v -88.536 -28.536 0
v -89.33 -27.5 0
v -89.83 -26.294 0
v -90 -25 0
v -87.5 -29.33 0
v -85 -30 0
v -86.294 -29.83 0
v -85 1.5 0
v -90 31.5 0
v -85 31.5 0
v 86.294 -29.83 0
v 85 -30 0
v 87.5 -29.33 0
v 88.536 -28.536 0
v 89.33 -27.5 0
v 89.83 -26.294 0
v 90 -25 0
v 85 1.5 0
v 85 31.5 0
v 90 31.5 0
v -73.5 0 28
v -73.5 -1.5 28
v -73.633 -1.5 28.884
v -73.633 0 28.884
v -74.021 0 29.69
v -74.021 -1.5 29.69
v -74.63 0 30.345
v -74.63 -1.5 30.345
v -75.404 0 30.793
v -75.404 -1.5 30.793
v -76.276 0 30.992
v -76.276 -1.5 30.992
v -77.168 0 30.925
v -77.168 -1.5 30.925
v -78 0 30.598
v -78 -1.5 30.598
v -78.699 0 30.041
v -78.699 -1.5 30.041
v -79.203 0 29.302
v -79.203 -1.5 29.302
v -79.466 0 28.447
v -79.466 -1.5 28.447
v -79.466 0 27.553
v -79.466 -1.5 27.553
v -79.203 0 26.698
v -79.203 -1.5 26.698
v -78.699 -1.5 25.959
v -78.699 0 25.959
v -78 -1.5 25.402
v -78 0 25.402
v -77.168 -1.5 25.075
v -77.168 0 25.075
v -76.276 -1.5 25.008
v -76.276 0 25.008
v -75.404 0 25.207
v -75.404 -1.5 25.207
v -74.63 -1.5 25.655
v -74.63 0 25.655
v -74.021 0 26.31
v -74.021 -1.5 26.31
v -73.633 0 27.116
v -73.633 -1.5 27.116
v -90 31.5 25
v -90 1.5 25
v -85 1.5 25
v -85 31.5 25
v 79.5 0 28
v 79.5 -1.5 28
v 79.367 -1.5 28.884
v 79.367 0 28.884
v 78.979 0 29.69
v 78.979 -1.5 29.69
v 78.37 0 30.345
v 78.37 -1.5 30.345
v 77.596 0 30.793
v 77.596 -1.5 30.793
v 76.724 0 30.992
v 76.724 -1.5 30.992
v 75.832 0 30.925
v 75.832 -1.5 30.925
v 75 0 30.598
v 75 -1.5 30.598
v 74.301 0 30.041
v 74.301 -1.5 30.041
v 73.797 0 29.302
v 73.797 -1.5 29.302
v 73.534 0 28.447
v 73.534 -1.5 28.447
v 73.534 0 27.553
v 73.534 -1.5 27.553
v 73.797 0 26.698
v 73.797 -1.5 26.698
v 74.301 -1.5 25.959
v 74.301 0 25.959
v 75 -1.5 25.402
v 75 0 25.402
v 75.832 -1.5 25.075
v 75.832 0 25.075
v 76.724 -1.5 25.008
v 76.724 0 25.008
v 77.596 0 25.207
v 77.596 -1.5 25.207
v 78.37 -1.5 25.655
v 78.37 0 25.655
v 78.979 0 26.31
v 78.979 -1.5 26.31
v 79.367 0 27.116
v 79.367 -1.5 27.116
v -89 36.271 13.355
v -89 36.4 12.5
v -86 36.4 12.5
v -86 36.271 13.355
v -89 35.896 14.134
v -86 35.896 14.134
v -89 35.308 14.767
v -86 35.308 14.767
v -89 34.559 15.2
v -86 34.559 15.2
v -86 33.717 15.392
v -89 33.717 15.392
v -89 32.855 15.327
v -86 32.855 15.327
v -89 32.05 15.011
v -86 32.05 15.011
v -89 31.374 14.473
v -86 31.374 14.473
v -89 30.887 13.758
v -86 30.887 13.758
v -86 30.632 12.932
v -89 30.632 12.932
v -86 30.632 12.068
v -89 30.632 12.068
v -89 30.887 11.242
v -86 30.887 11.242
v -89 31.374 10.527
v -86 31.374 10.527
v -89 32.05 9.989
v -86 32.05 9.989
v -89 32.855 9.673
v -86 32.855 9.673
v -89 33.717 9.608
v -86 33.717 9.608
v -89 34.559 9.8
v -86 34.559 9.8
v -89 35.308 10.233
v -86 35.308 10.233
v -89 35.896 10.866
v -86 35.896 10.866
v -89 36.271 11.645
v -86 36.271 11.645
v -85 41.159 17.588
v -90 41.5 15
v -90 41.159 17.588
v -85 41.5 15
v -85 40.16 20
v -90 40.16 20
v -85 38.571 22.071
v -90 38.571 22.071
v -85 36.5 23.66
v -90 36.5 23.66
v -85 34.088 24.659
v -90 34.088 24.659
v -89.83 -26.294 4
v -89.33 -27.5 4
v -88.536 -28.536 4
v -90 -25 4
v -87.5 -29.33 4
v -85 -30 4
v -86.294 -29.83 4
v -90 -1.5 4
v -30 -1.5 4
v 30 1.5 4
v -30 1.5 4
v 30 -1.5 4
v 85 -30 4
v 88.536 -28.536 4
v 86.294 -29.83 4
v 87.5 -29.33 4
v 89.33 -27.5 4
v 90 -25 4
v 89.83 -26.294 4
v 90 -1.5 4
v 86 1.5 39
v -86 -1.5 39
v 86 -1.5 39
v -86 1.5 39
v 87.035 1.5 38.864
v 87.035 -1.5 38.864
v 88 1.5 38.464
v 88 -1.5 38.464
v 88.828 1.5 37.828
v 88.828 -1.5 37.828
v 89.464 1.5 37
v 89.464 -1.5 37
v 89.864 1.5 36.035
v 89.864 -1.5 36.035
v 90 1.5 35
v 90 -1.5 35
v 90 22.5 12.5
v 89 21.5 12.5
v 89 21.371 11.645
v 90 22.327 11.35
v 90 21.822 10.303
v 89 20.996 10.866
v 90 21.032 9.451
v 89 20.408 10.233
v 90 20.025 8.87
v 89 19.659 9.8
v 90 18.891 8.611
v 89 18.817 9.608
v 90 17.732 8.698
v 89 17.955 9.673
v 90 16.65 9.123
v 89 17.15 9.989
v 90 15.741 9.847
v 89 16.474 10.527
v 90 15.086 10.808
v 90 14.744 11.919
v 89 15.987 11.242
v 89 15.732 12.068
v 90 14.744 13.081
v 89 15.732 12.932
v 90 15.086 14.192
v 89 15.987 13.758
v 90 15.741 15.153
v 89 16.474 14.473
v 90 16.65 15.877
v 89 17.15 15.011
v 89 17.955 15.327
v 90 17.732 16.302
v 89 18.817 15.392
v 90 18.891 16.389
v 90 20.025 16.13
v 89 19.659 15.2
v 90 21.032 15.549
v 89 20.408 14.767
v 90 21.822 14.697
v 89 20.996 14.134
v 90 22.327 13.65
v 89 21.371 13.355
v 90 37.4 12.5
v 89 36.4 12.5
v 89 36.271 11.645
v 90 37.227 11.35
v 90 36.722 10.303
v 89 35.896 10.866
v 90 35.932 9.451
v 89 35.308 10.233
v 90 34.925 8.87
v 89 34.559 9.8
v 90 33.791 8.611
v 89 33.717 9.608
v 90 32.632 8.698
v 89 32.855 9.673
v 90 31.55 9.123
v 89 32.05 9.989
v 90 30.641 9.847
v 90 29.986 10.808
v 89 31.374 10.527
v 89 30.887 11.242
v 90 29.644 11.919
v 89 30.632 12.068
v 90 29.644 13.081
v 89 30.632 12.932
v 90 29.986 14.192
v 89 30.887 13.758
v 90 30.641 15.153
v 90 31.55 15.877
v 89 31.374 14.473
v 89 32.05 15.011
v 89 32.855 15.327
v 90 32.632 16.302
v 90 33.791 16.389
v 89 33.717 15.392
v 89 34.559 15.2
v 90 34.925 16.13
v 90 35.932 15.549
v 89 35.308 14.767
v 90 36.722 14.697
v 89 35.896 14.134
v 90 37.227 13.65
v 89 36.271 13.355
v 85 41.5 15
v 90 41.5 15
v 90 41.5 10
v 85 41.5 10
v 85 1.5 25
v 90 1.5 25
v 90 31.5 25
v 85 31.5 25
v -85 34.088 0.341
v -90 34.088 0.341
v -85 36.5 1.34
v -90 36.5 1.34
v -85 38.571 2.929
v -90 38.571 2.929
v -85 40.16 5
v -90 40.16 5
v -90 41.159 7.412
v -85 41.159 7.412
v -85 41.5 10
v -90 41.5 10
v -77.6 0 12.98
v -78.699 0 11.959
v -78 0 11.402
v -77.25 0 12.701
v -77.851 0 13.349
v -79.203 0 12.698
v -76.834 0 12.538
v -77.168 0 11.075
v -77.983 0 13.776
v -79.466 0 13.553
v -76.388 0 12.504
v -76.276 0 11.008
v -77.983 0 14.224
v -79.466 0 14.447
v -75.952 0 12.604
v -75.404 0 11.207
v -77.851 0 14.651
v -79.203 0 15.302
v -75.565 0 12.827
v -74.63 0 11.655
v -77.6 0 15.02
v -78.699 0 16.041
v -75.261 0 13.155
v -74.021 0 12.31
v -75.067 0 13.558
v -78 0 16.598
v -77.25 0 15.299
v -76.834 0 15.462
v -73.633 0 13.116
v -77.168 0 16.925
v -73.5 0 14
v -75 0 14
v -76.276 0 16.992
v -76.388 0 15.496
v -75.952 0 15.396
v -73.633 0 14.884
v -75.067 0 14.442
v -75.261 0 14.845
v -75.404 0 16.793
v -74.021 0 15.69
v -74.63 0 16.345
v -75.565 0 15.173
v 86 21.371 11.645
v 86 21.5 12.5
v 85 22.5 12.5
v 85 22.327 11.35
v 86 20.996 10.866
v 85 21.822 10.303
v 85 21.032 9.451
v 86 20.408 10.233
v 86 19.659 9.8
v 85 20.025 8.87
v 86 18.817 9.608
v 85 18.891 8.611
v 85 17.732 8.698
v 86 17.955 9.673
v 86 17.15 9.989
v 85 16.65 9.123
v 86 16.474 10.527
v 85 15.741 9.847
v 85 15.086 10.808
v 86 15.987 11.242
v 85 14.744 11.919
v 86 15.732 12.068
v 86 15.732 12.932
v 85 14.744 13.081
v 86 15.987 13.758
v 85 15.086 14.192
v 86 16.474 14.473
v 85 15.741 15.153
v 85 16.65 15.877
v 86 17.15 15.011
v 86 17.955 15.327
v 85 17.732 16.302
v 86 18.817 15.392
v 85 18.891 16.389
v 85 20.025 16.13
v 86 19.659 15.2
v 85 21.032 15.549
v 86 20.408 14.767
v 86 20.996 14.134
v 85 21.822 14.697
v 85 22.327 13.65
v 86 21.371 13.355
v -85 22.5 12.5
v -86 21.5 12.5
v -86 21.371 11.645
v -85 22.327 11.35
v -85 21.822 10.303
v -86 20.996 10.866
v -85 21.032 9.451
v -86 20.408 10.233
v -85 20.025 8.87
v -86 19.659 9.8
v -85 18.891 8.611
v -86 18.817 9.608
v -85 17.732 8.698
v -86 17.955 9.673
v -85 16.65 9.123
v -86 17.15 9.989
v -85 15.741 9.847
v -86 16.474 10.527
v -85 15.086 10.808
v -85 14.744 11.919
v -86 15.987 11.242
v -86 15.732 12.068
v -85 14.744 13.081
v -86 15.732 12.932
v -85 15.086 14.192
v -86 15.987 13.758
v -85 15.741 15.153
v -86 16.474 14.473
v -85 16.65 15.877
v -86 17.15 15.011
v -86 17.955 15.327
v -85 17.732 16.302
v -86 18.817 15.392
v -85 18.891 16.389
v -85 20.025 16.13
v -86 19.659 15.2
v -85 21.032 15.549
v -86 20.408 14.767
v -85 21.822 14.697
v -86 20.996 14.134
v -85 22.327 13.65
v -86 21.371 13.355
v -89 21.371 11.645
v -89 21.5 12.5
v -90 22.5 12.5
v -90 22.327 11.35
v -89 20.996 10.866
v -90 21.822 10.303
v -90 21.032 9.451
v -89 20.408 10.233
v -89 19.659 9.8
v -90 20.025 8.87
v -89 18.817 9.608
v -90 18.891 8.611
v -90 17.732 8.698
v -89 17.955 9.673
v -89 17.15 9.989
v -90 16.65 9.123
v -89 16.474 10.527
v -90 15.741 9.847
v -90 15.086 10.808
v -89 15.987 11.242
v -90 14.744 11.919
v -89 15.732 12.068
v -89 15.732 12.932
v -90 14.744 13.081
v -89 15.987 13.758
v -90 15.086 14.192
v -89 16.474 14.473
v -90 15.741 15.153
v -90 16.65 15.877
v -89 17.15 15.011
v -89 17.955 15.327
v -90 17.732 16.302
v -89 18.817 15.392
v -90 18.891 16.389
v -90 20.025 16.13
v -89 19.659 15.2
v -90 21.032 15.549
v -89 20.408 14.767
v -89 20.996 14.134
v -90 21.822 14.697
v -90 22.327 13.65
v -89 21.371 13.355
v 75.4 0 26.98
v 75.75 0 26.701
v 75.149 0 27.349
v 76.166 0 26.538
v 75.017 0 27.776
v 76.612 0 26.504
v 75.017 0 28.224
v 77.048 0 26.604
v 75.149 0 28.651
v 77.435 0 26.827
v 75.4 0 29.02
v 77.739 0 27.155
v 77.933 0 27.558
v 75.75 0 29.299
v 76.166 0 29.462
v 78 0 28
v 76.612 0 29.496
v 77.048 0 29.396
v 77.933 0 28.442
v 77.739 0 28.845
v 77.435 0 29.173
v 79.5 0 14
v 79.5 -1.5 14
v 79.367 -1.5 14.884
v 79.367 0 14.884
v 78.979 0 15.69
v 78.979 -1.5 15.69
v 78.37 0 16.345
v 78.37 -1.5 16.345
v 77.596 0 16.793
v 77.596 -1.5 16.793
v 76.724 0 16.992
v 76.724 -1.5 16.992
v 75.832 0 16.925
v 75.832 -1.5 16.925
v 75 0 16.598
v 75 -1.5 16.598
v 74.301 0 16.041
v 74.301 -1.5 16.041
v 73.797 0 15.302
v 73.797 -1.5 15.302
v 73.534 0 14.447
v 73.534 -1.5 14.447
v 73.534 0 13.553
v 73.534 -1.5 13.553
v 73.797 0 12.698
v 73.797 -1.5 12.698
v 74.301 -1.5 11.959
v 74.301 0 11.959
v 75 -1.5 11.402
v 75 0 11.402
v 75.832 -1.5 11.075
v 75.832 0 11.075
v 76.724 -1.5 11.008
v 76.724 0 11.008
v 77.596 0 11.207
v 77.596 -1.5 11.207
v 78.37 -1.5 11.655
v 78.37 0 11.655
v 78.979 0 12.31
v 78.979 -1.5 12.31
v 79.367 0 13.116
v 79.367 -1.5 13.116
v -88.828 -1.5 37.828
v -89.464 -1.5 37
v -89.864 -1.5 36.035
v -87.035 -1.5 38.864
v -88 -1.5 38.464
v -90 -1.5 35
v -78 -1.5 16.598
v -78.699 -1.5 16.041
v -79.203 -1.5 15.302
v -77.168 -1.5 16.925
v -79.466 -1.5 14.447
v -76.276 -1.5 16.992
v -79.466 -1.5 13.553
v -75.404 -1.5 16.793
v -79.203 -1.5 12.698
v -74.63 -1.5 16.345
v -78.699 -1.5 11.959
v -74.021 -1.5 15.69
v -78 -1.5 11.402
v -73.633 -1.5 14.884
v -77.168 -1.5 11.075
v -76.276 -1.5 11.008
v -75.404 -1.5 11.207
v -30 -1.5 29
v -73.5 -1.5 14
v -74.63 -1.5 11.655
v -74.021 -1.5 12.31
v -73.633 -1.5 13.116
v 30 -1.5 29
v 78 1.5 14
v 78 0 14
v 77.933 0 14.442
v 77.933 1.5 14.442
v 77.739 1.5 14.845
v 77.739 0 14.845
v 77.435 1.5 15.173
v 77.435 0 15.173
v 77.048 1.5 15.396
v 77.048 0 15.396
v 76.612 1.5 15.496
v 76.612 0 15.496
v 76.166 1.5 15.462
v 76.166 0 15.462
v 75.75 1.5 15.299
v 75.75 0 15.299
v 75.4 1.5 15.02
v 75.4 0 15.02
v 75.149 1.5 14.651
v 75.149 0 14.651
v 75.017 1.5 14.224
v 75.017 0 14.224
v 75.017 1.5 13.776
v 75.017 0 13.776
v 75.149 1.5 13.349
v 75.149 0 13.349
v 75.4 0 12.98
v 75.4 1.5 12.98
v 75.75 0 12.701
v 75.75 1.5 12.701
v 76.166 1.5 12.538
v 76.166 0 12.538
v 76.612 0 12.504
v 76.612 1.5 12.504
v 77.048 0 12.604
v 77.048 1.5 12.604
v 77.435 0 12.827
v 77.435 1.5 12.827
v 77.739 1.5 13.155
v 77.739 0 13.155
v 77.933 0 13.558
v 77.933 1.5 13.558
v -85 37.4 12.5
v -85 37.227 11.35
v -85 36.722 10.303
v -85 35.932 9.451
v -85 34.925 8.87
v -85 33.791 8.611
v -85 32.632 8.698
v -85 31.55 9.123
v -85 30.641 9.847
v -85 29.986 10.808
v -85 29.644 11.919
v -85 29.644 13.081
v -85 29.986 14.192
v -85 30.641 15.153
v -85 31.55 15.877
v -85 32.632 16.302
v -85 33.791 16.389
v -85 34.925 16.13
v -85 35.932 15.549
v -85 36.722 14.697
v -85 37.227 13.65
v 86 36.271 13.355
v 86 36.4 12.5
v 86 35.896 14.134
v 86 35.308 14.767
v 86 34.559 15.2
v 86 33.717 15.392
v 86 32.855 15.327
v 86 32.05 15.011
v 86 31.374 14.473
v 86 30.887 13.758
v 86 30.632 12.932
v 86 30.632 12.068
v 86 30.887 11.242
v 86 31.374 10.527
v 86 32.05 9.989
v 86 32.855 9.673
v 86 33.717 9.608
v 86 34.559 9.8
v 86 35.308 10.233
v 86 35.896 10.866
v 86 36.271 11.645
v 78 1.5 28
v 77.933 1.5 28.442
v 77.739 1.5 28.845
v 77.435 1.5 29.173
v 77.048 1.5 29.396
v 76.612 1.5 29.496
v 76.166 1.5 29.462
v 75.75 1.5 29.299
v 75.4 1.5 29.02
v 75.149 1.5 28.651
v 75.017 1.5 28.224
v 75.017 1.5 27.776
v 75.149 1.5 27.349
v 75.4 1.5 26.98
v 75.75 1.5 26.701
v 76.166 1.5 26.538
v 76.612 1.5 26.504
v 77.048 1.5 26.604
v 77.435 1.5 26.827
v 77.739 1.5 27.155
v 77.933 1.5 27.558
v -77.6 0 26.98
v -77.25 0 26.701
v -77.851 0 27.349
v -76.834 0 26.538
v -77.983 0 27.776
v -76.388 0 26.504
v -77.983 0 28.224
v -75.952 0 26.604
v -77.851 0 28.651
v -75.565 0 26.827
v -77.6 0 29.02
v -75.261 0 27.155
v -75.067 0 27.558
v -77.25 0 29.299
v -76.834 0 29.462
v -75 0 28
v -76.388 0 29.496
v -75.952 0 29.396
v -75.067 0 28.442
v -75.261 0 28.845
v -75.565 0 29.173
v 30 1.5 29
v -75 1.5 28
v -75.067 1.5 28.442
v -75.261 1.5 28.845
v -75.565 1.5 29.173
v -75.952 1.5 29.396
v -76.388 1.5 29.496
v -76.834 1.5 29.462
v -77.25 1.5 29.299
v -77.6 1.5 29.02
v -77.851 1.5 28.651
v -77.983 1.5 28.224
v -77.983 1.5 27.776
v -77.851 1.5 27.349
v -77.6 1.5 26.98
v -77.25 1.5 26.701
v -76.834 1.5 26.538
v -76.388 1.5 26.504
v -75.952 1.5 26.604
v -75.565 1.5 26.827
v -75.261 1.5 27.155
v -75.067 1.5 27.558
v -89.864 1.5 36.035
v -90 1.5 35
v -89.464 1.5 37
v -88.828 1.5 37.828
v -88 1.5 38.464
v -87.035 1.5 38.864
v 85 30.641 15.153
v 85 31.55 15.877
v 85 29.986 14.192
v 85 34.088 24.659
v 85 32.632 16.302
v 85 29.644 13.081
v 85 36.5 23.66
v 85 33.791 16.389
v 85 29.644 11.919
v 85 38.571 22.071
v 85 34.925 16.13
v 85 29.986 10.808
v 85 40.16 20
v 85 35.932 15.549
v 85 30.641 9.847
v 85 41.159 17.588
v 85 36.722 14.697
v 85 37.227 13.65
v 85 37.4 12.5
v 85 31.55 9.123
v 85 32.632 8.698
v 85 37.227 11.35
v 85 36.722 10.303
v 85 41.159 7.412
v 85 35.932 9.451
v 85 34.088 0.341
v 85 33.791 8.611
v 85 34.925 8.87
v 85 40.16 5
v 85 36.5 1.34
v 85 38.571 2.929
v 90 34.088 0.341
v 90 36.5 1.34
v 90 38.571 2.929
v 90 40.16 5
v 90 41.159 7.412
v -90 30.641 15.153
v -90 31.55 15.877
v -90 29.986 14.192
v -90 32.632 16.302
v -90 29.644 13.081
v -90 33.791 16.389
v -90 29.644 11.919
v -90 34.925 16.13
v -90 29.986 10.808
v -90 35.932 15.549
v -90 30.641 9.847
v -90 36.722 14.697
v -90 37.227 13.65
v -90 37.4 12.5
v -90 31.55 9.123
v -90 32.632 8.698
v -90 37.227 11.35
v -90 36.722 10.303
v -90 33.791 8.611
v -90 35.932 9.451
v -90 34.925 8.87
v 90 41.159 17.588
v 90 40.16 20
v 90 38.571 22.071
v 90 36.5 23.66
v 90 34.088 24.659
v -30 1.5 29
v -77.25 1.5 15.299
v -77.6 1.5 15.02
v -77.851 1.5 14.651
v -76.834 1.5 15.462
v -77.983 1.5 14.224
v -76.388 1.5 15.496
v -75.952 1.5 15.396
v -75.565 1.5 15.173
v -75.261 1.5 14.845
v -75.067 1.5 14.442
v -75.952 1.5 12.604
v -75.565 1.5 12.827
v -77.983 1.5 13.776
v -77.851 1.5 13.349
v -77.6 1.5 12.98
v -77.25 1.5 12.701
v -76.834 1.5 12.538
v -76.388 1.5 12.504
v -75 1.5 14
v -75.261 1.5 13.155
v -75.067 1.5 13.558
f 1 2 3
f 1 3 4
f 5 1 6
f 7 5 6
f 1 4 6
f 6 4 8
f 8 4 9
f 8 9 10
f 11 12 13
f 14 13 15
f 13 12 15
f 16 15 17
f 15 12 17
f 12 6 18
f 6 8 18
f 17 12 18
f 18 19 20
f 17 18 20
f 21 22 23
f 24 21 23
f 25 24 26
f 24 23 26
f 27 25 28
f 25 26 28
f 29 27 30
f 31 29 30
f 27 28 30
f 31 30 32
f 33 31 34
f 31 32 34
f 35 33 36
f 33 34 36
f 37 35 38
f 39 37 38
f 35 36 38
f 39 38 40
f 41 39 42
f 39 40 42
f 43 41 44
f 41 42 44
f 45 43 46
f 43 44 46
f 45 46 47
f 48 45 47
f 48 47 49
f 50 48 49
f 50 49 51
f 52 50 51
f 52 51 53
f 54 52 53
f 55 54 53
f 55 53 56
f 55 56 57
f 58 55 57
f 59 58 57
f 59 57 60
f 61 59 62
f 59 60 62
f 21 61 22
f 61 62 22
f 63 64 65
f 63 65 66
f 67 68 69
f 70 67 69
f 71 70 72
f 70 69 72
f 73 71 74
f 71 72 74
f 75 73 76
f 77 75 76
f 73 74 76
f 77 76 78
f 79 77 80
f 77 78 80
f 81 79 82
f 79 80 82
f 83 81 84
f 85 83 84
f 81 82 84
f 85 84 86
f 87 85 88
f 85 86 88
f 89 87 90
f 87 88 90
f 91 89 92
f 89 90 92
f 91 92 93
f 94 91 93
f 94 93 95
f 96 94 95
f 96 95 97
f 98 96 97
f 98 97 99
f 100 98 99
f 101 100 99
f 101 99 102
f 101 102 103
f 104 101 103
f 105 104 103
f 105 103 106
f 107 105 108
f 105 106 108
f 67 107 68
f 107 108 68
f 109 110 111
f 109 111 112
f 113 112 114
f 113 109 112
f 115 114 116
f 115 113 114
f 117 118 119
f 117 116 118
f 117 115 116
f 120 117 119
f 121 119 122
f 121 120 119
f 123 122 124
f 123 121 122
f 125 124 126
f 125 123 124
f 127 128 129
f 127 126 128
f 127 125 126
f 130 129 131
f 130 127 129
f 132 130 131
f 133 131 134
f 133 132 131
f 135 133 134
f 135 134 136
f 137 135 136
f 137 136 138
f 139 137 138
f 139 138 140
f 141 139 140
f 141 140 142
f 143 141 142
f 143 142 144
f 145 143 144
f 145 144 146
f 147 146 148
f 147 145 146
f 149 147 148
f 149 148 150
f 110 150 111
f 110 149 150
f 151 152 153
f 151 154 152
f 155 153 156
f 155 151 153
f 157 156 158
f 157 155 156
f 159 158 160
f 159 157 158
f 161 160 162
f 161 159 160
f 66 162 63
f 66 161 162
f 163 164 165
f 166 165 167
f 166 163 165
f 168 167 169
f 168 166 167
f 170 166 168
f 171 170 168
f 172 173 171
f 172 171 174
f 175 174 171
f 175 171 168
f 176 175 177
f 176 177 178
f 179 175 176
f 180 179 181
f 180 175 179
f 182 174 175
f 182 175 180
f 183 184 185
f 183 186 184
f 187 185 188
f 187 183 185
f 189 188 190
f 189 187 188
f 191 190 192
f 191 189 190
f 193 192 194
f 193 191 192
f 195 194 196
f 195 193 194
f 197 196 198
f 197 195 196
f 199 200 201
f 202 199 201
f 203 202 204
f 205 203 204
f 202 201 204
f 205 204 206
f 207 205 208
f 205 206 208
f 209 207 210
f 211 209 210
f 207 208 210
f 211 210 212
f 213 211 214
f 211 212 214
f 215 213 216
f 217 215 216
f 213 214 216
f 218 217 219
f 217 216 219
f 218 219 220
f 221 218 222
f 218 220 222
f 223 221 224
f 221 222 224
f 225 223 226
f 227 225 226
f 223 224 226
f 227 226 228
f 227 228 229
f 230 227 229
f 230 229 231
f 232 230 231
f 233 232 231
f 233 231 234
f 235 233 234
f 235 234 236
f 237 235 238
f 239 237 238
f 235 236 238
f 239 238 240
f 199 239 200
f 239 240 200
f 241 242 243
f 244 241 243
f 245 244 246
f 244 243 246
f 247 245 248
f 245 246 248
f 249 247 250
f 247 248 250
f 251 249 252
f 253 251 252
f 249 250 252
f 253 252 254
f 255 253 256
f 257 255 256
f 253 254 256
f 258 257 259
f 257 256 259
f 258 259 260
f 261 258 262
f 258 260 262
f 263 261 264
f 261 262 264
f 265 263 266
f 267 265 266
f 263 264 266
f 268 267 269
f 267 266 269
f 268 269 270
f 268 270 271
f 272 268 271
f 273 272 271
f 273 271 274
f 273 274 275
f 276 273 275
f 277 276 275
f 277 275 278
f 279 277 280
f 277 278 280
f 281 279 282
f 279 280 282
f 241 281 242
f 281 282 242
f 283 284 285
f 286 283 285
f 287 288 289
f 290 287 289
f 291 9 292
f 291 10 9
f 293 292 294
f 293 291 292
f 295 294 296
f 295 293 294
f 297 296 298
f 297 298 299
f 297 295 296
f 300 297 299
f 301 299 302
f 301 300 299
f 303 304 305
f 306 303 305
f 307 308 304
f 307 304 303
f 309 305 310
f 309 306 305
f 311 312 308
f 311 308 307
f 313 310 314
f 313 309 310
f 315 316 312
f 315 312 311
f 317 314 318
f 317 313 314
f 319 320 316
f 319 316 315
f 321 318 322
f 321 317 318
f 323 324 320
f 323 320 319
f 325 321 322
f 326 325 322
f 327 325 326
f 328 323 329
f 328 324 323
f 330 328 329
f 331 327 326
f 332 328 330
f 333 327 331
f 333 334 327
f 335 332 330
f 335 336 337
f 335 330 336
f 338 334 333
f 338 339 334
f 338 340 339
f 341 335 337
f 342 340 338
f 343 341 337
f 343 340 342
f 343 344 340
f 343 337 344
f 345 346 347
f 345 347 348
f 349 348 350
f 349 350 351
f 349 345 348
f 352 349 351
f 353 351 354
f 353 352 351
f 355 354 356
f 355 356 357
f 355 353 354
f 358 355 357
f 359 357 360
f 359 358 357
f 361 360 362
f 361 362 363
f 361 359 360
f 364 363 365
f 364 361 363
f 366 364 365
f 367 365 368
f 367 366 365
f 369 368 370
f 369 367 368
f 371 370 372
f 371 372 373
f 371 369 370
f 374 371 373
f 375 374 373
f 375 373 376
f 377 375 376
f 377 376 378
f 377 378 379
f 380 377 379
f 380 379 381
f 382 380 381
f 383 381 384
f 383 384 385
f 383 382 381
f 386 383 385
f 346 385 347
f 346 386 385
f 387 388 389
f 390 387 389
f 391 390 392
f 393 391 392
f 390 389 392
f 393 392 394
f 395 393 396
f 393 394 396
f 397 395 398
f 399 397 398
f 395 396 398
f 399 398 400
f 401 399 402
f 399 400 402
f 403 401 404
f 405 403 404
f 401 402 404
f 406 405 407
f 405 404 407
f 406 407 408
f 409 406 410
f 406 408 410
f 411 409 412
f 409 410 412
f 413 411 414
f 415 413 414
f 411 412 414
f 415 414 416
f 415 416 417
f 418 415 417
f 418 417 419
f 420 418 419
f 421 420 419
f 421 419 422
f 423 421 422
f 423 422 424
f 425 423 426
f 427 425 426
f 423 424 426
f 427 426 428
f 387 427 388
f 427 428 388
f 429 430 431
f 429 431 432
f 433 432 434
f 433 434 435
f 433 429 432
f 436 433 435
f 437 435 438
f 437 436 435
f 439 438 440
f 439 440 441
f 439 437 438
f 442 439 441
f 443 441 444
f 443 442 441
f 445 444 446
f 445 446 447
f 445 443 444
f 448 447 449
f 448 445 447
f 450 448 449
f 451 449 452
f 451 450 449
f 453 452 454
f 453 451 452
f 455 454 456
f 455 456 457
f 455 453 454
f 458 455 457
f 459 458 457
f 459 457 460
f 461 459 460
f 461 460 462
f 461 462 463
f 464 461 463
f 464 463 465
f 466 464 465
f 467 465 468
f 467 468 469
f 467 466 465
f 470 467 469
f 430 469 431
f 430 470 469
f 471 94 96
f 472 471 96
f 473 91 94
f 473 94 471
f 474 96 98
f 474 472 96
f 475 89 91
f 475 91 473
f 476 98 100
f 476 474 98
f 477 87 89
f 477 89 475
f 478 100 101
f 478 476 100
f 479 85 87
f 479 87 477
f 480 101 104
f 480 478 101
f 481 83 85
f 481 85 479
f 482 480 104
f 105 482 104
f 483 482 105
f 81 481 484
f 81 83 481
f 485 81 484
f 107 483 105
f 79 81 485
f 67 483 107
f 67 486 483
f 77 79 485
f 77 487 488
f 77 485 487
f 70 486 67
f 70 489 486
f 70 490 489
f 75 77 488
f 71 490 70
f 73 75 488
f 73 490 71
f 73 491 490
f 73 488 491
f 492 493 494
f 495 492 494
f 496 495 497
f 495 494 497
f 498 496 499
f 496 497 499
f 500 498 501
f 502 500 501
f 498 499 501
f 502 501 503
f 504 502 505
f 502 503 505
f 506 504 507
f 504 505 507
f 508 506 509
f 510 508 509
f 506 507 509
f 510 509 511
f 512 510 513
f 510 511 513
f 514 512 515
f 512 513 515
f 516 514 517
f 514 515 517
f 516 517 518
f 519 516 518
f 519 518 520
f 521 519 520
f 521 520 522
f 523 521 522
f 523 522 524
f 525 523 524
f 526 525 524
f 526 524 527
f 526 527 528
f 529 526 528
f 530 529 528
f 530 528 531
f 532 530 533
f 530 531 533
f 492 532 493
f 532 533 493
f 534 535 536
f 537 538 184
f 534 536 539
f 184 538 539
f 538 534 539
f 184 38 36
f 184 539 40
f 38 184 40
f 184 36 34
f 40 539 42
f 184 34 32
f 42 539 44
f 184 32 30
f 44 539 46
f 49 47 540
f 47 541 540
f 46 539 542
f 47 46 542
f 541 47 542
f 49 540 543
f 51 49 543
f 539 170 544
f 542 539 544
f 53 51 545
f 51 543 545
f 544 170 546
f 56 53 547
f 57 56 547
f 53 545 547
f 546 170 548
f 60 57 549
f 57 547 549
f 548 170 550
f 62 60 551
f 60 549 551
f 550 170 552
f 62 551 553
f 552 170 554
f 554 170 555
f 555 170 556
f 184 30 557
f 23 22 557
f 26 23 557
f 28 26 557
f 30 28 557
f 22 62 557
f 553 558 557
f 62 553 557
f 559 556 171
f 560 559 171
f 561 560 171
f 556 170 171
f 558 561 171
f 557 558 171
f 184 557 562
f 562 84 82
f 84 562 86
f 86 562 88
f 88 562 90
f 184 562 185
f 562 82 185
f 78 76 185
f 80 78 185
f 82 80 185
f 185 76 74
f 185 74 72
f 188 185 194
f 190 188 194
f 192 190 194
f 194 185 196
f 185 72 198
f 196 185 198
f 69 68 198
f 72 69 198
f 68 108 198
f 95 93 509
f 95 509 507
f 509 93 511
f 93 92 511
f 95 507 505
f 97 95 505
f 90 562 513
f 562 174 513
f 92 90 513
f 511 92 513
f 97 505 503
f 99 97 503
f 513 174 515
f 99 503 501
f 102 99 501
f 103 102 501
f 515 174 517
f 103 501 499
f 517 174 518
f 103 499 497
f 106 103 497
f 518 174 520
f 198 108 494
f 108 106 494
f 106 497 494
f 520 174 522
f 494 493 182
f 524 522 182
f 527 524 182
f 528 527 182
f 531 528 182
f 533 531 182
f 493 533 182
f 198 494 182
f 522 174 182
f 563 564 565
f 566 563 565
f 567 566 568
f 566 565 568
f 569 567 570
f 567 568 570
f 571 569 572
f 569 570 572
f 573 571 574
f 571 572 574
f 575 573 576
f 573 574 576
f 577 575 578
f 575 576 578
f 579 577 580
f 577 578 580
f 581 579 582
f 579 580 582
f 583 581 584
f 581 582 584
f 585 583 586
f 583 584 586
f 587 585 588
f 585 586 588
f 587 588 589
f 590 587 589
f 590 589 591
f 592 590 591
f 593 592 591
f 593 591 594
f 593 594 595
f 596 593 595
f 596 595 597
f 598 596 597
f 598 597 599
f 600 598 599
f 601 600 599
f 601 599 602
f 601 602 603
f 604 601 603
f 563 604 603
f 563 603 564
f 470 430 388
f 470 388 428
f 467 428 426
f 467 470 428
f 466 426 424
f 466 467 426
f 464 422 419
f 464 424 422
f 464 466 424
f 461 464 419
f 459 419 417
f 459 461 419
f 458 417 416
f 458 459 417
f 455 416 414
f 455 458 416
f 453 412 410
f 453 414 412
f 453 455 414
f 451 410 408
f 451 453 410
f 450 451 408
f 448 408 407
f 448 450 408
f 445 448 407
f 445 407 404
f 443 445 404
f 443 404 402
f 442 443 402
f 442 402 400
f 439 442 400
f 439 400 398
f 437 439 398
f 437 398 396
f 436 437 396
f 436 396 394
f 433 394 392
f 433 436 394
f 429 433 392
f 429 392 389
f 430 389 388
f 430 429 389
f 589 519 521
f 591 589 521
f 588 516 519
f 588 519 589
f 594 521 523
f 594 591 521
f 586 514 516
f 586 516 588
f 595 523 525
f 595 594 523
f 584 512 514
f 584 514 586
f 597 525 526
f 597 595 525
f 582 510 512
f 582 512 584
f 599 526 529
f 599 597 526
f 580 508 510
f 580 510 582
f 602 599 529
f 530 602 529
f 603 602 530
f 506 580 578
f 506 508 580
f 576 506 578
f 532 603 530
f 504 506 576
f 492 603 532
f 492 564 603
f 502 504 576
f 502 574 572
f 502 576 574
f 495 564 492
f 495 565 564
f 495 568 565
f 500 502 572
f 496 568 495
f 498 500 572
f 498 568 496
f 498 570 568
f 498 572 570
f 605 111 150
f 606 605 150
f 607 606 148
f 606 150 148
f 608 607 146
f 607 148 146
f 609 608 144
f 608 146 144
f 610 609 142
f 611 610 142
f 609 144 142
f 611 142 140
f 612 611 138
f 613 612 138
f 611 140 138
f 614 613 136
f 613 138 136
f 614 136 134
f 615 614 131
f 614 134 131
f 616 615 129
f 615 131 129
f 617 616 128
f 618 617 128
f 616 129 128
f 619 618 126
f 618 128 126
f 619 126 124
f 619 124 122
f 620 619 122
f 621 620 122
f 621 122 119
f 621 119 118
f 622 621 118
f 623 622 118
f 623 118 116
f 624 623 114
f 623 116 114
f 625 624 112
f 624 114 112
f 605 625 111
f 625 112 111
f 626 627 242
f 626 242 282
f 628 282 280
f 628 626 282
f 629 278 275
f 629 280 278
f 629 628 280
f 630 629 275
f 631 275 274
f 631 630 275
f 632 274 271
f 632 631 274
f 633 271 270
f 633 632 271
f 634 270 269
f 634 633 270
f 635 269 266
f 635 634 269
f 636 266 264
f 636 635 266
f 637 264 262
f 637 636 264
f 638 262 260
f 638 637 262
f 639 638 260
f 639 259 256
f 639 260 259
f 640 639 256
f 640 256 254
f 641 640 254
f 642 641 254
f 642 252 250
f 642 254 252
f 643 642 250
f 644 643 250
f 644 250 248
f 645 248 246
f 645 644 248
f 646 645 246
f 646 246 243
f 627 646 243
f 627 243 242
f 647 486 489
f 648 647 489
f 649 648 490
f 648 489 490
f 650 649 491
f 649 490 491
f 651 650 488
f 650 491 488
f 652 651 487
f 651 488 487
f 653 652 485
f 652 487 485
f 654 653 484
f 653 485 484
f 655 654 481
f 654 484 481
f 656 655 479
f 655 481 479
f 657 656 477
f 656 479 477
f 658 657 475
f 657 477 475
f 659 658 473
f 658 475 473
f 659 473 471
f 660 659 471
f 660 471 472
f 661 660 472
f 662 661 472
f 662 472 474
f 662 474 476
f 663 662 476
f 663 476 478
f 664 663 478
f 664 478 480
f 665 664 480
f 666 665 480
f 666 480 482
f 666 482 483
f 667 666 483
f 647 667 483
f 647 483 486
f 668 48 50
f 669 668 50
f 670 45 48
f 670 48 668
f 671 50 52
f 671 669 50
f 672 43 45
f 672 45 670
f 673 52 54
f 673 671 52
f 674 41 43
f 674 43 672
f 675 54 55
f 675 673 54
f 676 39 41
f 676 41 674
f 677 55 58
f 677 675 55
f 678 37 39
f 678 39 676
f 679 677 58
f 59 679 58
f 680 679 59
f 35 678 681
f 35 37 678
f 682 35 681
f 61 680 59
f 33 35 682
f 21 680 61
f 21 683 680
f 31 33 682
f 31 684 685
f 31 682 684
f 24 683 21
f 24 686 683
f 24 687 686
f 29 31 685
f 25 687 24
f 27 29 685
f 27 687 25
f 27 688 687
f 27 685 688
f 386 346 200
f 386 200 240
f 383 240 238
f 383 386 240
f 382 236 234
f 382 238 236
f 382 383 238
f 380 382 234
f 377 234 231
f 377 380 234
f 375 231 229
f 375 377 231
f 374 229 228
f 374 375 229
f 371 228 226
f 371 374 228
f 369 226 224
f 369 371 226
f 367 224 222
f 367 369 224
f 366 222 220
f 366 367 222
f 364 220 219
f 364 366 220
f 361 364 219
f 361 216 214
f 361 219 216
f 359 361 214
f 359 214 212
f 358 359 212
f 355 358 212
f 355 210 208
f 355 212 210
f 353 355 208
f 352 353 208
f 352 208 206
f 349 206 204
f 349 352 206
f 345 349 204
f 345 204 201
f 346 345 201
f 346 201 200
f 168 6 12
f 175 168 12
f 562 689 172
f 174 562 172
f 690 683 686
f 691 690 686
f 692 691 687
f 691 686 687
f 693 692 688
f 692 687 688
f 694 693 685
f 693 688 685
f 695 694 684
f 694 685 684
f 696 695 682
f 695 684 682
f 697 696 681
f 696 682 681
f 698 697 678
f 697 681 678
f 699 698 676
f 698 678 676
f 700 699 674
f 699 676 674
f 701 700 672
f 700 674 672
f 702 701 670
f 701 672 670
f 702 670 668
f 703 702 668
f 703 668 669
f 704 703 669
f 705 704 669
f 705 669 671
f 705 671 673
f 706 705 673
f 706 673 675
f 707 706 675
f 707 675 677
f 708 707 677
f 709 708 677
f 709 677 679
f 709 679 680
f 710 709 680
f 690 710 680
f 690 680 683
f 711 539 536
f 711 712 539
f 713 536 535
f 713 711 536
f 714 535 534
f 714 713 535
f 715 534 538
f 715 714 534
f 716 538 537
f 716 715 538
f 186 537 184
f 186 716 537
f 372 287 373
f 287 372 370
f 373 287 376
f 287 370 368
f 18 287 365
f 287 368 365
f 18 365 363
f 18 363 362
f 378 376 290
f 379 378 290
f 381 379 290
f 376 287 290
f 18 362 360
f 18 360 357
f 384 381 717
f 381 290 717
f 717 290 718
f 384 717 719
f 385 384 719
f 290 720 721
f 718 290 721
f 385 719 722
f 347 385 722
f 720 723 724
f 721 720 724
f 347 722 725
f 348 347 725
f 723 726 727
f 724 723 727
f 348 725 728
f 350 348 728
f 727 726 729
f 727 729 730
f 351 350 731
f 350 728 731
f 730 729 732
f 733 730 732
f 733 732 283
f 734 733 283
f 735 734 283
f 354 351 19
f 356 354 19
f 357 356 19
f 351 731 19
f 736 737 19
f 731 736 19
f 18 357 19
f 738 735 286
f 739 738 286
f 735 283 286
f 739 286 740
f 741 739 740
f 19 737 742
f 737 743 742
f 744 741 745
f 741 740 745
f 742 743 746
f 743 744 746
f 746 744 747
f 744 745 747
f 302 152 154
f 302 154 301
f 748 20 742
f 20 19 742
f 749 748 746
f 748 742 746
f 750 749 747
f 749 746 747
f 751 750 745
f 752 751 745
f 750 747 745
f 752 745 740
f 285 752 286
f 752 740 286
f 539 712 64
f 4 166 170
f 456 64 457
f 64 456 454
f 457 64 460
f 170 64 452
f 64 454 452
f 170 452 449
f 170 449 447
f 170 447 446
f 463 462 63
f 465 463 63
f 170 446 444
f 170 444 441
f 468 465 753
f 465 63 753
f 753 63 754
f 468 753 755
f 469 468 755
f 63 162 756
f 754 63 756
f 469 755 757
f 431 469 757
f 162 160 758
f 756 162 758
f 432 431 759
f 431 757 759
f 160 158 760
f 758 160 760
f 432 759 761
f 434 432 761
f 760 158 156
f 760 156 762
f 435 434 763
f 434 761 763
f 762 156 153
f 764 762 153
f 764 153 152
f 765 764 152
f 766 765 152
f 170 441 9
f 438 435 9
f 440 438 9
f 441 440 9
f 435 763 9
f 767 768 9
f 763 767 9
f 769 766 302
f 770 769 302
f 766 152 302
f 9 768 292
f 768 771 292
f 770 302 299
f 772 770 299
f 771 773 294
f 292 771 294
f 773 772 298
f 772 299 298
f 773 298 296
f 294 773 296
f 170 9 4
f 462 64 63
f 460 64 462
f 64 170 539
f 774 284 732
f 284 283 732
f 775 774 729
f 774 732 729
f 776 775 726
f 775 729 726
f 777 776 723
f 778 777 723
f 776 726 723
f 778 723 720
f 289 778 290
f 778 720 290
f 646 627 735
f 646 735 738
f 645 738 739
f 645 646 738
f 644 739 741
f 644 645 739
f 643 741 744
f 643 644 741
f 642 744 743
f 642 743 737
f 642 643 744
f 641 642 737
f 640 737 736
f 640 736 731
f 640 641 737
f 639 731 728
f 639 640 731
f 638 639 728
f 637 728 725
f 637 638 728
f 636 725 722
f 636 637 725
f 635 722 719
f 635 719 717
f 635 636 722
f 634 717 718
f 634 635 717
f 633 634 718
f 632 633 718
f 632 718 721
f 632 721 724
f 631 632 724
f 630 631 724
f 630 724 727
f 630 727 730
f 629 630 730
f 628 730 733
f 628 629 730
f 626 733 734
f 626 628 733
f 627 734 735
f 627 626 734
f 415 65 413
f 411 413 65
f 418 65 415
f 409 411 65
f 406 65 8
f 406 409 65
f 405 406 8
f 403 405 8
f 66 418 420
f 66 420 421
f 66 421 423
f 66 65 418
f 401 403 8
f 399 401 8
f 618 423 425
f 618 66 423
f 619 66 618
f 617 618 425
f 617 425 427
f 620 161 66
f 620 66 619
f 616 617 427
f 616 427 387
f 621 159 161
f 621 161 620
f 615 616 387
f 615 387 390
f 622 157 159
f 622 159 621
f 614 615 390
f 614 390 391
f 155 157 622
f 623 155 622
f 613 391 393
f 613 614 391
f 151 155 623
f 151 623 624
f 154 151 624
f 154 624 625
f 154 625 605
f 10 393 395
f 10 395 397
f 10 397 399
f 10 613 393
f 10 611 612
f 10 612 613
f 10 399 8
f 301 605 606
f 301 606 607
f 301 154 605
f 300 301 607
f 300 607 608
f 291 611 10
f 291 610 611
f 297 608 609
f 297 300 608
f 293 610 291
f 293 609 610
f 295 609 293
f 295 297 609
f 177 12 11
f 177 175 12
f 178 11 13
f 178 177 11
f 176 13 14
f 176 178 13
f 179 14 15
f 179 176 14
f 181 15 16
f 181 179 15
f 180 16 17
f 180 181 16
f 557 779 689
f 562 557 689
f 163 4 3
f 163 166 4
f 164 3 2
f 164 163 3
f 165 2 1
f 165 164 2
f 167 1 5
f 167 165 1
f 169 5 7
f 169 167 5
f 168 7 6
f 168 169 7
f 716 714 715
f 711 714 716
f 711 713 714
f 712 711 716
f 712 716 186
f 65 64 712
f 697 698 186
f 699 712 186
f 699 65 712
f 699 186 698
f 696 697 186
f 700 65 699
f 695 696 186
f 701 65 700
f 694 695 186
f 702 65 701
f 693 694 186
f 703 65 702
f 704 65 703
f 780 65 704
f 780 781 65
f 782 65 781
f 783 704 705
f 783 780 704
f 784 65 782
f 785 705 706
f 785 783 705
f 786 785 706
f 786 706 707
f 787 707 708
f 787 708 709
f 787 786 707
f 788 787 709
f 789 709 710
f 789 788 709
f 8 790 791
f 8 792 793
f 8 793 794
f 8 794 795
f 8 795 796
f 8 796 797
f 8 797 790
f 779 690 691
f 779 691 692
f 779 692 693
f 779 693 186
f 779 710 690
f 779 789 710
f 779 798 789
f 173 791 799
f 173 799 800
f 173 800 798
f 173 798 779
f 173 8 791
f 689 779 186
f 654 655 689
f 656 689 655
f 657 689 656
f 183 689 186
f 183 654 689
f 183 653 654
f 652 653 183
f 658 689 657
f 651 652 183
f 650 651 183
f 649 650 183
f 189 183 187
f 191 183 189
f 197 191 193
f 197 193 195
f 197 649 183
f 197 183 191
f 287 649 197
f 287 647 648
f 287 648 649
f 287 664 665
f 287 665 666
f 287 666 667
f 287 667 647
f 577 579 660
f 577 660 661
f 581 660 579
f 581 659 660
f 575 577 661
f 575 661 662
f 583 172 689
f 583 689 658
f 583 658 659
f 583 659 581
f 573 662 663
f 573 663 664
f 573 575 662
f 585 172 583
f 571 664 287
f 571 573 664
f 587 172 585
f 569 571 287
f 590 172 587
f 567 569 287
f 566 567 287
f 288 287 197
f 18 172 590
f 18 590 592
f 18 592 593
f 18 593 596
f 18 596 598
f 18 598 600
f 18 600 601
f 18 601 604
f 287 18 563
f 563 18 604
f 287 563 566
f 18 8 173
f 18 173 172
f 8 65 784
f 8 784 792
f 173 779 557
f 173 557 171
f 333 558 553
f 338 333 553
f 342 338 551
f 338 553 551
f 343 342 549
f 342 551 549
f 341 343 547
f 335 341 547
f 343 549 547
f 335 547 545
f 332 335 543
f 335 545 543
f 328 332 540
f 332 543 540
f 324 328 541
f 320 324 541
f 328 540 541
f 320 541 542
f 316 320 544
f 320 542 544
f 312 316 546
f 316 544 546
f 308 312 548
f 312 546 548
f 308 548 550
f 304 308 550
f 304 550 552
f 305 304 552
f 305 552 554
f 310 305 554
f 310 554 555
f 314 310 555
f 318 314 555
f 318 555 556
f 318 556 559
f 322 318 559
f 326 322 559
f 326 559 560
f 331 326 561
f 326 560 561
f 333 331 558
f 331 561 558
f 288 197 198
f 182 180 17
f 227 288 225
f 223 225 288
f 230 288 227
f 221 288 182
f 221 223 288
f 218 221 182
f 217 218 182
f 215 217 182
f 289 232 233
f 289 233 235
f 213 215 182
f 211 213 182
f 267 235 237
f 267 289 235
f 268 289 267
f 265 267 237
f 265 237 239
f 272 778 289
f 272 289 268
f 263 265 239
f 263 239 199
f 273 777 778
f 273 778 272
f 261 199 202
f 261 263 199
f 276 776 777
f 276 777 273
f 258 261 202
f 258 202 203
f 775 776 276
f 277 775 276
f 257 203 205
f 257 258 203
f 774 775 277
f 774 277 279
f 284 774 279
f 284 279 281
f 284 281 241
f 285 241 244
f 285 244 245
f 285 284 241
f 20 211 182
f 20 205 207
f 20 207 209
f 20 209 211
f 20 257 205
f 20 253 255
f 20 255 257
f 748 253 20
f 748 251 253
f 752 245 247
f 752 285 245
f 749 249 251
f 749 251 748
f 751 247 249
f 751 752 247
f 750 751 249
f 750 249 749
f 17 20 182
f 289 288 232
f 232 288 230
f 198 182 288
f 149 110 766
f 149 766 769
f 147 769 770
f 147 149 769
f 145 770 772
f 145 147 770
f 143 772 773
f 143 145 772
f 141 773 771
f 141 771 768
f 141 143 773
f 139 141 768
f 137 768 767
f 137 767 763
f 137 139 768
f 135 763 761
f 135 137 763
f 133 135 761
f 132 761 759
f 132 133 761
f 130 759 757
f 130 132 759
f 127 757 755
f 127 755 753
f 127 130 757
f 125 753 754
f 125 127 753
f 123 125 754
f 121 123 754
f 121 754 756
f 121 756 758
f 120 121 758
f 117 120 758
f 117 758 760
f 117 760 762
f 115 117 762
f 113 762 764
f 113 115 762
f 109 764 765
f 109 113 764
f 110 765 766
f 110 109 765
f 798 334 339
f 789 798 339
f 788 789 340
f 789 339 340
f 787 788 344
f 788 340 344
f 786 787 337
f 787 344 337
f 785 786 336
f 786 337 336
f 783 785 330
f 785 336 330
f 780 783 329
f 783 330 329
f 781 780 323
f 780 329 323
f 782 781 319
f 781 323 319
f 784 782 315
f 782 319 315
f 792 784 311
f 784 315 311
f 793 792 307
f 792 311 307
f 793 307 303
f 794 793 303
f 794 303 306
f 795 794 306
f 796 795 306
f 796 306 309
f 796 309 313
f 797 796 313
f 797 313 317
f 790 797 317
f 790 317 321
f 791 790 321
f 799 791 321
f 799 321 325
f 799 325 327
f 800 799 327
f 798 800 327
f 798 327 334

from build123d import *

# Parameters (mm, degrees)
SKETCH_1_W               = 180
SKETCH_1_H               = 60
EXTRUDE_1_DEPTH          = 4
SKETCH_2_W               = 180
SKETCH_2_H               = 3
EXTRUDE_2_DEPTH          = 35
SKETCH_3_R               = 1.5
CUT_EXTRUDE_1_DEPTH      = 50
FILLET_3_R               = 4
SKETCH_6_R               = 3
CUT_EXTRUDE_4_DEPTH      = 1.5
SKETCH_7_W               = 60
SKETCH_7_H               = 25
CUT_EXTRUDE_5_DEPTH      = 10
CUT_EXTRUDE_6_DEPTH      = 102.118742081
CUT_EXTRUDE_6_DEPTH_BACK = 102.118742081
SKETCH_8_W               = 180
SKETCH_8_H               = 28.5
SKETCH_9_W               = 25
SKETCH_9_H               = 40
EXTRUDE_3_DEPTH          = 5
CUT_EXTRUDE_7_DEPTH      = 189.794200123
CUT_EXTRUDE_7_DEPTH_BACK = 189.794200123
SKETCH_10_R              = 2.9
CHAMFER_2_SIZE           = 1
FILLET_4_R               = 5
CHAMFER_3_SIZE           = 1
FILLET_5_R               = 10
CHAMFER_4_SIZE           = 1


with BuildPart() as part:
    # 草图1 → 凸台-拉伸1 (new body)
    with BuildSketch(Plane.XY):
        Rectangle(SKETCH_1_W, SKETCH_1_H)
    extrude(amount=EXTRUDE_1_DEPTH)

    # 草图2 → 凸台-拉伸2 (add)
    with BuildSketch(Plane.XY.offset(4)):
        Rectangle(SKETCH_2_W, SKETCH_2_H)
    extrude(amount=EXTRUDE_2_DEPTH)

    # 草图3 → 切除-拉伸1 (cut)
    with BuildSketch(Plane.XZ.offset(1.5)):
        with Locations((-76.5, 28)):
            Circle(SKETCH_3_R)
        with Locations((-76.5, 14)):
            Circle(SKETCH_3_R)
        with Locations((76.5, 28)):
            Circle(SKETCH_3_R)
        with Locations((76.5, 14)):
            Circle(SKETCH_3_R)
    extrude(amount=-CUT_EXTRUDE_1_DEPTH, mode=Mode.SUBTRACT)

    # 圆角3
    fillet_3_edges = [part.edges().sort_by_distance(p)[0] for p in [
        (-90, 0, 39),
        (90, 0, 39),
    ]]
    fillet(fillet_3_edges, radius=FILLET_3_R)

    # 草图6 → 切除-拉伸4 (cut)
    with BuildSketch(Plane.XZ.offset(1.5)):
        with Locations((-76.5, 28)):
            Circle(SKETCH_6_R)
        with Locations((-76.5, 14)):
            Circle(SKETCH_6_R)
        with Locations((76.5, 28)):
            Circle(SKETCH_6_R)
        with Locations((76.5, 14)):
            Circle(SKETCH_6_R)
    extrude(amount=-CUT_EXTRUDE_4_DEPTH, mode=Mode.SUBTRACT)

    # 草图7 → 切除-拉伸5 (cut)
    with BuildSketch(Plane(origin=(0, 1.5, 0), x_dir=(1, 0, 0), z_dir=(0, 1, 0))):
        with Locations((0, -16.5)):
            Rectangle(SKETCH_7_W, SKETCH_7_H)
    extrude(amount=-CUT_EXTRUDE_5_DEPTH, mode=Mode.SUBTRACT)

    # 草图8 → 切除-拉伸6 (cut, two sides: drawn at the far end of the back side and taken through both)
    with BuildSketch(Plane.XY.offset(4).offset(-CUT_EXTRUDE_6_DEPTH_BACK)):
        with Locations((0, 15.75)):
            Rectangle(SKETCH_8_W, SKETCH_8_H)
    extrude(amount=CUT_EXTRUDE_6_DEPTH + CUT_EXTRUDE_6_DEPTH_BACK, mode=Mode.SUBTRACT)

    # 草图9 → 凸台-拉伸3 (add)
    with BuildSketch(Plane(origin=(90, 0, 0), x_dir=(0, 0, -1), z_dir=(1, 0, 0))):
        with Locations((-12.5, 21.5)):
            Rectangle(SKETCH_9_W, SKETCH_9_H)
    extrude_3 = extrude(amount=-EXTRUDE_3_DEPTH)

    # 镜向1: 凸台-拉伸3 across plane
    add(extrude_3.mirror(Plane(origin=(0, 0, 0), x_dir=(0, 0, 1), z_dir=(1, 0, 0))))

    # 草图10 → 切除-拉伸7 (cut, two sides: drawn at the far end of the back side and taken through both)
    with BuildSketch(Plane(origin=(90, 0, 0), x_dir=(0, 0, -1), z_dir=(1, 0, 0)).offset(-CUT_EXTRUDE_7_DEPTH_BACK)):
        with Locations(Location((-12.5, 33.5, 0), (0, 0, 90))):
            Circle(SKETCH_10_R)
        with Locations(Location((-12.5, 18.6, 0), (0, 0, 90))):
            Circle(SKETCH_10_R)
    extrude(amount=CUT_EXTRUDE_7_DEPTH + CUT_EXTRUDE_7_DEPTH_BACK, mode=Mode.SUBTRACT)

    # 倒角2
    chamfer_2_edges = [part.edges().sort_by_distance(p)[0] for p in [
        (85, 30.6, 12.5),
        (90, 30.6, 12.5),
        (-90, 30.6, 12.5),
        (-85, 30.6, 12.5),
    ]]
    chamfer(chamfer_2_edges, length=CHAMFER_2_SIZE)

    # 圆角4
    fillet_4_edges = [part.edges().sort_by_distance(p)[0] for p in [
        (90, -30, 2),
        (-90, -30, 2),
    ]]
    fillet(fillet_4_edges, radius=FILLET_4_R)

    # 倒角3
    chamfer_3_edges = [part.edges().sort_by_distance(p)[0] for p in [
        (90, 15.7, 12.5),
        (-90, 15.7, 12.5),
    ]]
    chamfer(chamfer_3_edges, length=CHAMFER_3_SIZE)

    # 圆角5
    fillet_5_edges = [part.edges().sort_by_distance(p)[0] for p in [
        (87.5, 41.5, 0),
        (87.5, 41.5, 25),
        (-87.5, 41.5, 0),
        (-87.5, 41.5, 25),
    ]]
    fillet(fillet_5_edges, radius=FILLET_5_R)

    # 倒角4
    chamfer_4_edges = [part.edges().sort_by_distance(p)[0] for p in [
        (85, 15.7, 12.5),
        (-85, 15.7, 12.5),
    ]]
    chamfer(chamfer_4_edges, length=CHAMFER_4_SIZE)


solid = part.part
